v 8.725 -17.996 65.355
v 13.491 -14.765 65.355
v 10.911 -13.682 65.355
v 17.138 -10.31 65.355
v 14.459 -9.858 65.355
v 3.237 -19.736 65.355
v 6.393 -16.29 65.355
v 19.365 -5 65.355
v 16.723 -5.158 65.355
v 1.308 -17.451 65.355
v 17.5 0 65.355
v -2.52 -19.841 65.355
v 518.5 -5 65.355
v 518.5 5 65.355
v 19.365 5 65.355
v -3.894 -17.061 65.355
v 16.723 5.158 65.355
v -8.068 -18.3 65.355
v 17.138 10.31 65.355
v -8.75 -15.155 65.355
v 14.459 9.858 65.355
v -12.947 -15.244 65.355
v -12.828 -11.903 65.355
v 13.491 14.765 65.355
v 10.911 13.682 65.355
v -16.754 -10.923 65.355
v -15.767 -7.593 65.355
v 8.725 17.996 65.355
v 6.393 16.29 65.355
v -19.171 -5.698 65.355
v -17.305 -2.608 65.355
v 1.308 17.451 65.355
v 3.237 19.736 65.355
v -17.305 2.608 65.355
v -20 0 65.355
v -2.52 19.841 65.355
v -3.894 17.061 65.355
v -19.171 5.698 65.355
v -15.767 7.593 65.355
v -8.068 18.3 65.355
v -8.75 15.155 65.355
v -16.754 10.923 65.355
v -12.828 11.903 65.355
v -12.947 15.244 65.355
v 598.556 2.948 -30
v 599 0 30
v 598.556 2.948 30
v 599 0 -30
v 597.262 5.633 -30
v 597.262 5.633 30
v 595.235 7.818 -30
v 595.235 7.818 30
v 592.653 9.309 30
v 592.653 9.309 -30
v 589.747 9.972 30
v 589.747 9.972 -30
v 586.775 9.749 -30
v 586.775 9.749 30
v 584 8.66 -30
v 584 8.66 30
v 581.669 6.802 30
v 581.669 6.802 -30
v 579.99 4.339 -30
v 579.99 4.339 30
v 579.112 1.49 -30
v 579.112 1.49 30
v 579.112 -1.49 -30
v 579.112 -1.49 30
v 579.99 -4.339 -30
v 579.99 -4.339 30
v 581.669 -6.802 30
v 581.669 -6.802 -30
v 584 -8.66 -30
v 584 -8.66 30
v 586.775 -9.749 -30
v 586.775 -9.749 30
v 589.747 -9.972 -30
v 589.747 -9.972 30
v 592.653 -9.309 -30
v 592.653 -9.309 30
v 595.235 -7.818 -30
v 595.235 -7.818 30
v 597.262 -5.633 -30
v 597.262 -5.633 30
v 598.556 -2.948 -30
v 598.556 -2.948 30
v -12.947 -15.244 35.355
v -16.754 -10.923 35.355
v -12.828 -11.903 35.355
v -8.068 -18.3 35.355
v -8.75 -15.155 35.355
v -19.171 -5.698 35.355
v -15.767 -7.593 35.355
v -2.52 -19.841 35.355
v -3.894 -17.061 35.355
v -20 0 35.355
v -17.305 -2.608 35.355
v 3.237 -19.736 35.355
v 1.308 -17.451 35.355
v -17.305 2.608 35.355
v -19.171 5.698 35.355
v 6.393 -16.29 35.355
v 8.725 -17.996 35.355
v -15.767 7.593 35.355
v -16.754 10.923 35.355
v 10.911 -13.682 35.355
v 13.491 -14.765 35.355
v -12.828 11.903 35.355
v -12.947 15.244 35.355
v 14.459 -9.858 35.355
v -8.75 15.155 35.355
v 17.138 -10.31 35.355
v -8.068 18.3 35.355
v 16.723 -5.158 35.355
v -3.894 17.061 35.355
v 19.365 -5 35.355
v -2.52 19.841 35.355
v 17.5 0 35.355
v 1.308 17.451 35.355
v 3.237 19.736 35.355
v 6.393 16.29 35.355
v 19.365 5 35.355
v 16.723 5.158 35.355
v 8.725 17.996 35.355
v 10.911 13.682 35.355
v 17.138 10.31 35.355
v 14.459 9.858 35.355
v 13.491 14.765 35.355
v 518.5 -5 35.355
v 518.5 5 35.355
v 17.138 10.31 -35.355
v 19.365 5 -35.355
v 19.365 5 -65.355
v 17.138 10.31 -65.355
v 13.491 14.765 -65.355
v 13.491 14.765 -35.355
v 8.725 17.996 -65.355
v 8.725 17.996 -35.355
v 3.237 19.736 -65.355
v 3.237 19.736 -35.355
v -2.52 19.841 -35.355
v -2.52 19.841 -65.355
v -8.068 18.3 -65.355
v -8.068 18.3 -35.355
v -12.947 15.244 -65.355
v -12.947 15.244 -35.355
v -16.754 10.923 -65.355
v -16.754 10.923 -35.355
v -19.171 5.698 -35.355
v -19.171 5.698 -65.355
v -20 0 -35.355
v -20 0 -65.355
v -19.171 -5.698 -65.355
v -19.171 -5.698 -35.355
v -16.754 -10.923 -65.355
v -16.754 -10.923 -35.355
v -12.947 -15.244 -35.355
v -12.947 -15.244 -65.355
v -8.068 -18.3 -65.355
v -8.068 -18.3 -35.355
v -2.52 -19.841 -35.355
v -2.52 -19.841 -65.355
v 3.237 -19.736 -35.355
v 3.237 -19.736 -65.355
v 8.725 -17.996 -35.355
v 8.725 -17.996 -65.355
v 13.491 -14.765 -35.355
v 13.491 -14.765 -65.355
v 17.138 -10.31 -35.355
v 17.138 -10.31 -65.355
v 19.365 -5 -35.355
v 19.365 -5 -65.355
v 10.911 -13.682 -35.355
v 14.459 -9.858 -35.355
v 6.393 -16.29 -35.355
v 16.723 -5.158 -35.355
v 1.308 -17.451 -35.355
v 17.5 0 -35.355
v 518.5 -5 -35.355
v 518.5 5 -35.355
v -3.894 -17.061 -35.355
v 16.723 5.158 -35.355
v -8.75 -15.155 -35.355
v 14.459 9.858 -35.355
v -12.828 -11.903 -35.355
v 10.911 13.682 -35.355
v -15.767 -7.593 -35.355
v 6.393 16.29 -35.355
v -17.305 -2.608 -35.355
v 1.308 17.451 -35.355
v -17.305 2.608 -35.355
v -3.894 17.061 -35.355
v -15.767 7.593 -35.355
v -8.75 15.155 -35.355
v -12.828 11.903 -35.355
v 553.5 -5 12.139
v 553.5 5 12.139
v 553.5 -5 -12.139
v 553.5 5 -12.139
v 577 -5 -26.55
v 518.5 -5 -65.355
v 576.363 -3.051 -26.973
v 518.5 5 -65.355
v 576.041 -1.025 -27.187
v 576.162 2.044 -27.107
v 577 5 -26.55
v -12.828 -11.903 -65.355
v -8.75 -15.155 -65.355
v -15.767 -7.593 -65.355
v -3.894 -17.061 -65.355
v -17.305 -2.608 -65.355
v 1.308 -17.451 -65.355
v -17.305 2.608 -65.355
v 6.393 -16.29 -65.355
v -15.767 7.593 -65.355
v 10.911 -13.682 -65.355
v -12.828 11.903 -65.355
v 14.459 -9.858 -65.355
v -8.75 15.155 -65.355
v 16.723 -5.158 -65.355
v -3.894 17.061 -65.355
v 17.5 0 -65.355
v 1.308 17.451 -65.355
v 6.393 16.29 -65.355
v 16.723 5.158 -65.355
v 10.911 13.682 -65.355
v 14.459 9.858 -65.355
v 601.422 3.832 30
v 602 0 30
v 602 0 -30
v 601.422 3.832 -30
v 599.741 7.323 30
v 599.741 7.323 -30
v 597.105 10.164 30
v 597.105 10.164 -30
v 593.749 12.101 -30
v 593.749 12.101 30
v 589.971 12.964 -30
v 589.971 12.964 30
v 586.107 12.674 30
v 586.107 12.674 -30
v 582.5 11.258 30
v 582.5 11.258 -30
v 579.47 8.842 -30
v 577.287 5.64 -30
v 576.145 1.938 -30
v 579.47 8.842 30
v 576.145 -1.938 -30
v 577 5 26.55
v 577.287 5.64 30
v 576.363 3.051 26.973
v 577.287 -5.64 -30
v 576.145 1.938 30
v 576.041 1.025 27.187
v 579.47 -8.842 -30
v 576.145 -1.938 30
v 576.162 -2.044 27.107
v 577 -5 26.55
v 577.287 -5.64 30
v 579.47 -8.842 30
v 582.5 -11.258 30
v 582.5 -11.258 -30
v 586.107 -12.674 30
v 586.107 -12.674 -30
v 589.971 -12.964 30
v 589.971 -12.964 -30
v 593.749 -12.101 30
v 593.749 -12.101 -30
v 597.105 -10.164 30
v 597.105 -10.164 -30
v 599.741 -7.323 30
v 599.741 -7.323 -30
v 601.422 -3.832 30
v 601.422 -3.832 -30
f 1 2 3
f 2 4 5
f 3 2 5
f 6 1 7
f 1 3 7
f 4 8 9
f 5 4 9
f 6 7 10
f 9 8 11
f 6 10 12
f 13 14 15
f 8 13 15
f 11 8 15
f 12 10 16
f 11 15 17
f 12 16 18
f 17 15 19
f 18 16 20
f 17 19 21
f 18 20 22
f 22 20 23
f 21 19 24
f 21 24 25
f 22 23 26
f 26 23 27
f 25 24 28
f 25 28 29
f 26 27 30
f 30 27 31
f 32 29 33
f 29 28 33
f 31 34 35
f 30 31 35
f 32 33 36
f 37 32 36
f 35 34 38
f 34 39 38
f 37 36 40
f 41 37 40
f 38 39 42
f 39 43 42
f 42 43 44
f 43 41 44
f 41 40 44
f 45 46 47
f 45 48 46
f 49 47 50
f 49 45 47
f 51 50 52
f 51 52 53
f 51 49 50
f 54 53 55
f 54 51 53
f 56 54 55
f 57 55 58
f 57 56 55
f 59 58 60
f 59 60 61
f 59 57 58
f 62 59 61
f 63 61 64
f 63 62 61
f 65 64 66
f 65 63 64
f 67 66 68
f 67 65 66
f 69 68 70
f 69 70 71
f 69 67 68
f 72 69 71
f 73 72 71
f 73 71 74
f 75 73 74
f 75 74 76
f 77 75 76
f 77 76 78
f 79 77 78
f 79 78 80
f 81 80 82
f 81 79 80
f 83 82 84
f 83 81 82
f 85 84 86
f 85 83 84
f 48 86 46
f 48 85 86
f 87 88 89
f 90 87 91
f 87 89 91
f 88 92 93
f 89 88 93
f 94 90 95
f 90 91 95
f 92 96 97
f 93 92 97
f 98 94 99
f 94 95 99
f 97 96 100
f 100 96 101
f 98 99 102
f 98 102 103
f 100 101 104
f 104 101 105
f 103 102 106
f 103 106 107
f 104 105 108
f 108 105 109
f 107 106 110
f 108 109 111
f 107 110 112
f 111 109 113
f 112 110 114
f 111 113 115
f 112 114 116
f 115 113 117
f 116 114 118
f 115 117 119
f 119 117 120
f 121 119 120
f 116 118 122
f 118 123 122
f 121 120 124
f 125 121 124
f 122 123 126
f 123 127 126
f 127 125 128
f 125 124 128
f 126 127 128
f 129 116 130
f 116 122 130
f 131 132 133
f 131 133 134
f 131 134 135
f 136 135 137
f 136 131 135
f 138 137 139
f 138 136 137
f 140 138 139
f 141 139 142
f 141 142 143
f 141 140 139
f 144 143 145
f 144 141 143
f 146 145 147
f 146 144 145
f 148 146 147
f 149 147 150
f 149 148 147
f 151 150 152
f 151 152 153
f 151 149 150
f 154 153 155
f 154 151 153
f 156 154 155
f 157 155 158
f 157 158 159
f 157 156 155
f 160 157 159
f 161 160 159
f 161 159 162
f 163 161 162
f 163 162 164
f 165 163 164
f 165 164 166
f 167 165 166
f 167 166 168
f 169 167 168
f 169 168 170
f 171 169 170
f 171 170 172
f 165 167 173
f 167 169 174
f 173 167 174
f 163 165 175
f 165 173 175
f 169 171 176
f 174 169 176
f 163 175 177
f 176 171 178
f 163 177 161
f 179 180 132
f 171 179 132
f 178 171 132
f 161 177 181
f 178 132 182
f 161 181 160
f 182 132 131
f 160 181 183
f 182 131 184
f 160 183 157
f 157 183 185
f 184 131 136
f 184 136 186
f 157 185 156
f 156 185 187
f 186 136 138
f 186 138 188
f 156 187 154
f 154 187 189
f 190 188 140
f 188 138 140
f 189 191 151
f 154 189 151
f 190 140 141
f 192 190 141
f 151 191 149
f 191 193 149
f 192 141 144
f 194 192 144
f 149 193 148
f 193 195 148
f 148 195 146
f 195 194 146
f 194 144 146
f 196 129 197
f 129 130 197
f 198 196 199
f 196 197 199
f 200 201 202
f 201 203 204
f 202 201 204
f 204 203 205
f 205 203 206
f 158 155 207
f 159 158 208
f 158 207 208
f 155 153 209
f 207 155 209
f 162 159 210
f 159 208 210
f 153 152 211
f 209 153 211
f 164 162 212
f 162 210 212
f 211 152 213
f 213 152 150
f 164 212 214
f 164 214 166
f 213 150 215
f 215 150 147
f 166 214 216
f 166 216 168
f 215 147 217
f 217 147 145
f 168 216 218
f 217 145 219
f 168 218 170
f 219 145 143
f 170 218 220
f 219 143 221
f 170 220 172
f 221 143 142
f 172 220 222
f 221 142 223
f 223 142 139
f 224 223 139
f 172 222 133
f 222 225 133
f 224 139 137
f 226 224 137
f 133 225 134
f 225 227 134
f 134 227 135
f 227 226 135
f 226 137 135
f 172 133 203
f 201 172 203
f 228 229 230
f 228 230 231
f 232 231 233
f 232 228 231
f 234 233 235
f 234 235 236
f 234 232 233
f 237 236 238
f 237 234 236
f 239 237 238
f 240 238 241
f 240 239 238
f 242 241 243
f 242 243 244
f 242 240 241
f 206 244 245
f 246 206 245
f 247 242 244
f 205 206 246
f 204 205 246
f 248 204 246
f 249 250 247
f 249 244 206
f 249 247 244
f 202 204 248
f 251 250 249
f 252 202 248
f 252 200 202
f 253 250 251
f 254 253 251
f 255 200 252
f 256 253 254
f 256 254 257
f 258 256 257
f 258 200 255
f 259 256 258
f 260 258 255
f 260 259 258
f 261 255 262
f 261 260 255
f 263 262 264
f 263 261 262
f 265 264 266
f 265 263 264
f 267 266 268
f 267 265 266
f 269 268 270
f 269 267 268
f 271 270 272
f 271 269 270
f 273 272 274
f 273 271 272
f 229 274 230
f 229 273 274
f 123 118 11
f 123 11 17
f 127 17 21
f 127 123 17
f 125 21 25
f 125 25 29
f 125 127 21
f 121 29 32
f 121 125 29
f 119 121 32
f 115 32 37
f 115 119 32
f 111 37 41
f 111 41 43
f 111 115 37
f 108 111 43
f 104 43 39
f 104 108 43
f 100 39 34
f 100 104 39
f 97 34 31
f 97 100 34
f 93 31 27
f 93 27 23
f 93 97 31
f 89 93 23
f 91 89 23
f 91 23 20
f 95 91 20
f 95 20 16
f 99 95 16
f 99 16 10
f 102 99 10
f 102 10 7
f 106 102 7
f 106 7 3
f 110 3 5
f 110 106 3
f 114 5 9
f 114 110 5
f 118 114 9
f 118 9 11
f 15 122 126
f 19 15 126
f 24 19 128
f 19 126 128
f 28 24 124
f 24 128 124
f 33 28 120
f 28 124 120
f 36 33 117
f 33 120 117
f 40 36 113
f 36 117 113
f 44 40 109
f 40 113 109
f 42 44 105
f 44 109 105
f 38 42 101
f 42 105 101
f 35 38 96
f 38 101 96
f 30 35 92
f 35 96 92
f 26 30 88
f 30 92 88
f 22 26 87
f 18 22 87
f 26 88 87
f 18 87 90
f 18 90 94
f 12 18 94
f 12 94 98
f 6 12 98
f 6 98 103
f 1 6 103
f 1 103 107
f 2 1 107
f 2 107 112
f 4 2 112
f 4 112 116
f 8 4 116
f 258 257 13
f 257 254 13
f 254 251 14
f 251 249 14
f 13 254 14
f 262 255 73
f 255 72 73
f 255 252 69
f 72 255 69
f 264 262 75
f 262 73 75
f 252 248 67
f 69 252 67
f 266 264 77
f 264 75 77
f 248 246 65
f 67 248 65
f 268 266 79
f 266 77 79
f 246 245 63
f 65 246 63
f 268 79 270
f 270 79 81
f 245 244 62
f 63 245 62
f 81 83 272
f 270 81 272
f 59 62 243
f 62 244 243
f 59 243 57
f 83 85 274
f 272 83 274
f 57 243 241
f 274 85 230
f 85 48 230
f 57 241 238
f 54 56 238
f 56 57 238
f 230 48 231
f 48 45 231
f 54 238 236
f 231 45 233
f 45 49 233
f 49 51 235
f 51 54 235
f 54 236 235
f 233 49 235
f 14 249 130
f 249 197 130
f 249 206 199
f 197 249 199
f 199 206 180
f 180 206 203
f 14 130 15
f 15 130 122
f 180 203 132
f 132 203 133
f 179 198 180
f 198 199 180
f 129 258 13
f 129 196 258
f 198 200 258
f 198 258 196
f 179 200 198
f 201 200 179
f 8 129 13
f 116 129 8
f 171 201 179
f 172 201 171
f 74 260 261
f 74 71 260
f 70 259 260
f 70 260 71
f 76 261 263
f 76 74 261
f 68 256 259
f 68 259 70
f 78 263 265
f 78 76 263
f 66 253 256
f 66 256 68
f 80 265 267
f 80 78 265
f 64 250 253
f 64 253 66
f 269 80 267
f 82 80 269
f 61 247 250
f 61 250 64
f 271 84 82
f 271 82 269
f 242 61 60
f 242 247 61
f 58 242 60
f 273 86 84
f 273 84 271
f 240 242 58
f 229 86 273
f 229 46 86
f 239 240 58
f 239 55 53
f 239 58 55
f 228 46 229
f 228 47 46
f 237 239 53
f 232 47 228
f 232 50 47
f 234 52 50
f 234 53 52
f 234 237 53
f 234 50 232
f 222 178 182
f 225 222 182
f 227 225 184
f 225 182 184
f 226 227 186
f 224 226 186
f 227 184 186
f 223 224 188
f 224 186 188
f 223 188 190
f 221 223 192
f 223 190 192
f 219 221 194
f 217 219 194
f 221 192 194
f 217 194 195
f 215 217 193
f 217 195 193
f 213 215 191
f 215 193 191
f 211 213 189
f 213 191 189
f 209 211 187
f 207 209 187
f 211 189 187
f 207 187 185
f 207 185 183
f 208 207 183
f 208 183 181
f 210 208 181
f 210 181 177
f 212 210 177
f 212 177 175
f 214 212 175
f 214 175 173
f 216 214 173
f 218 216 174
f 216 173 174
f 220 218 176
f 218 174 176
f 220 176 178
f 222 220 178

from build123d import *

# Parameters (mm, degrees)
SKETCH2_R           = 20
SKETCH2_R_2         = 17.5
BOSS_EXTRUDE1_DEPTH = 30
SKETCH3_R           = 20
SKETCH3_R_2         = 17.5
BOSS_EXTRUDE2_DEPTH = 30
BOSS_EXTRUDE3_DEPTH = 5
SKETCH5_R           = 13
SKETCH5_R_2         = 10
BOSS_EXTRUDE4_DEPTH = 30


with BuildPart() as part:
    # Sketch2 → Boss-Extrude1 (new body)
    with BuildSketch(Plane.XY.offset(-35.355)):
        Circle(SKETCH2_R)
        Circle(SKETCH2_R_2, mode=Mode.SUBTRACT)
    extrude(amount=-BOSS_EXTRUDE1_DEPTH)



with BuildPart() as body_2:
    # Sketch3 → Boss-Extrude2 (new body)
    with BuildSketch(Plane.XY.offset(35.355)):
        Circle(SKETCH3_R)
        Circle(SKETCH3_R_2, mode=Mode.SUBTRACT)
    extrude(amount=BOSS_EXTRUDE2_DEPTH)


with BuildPart() as part_1:
    add(part.part)

    add(body_2.part)  # Boss-Extrude3 merges body 2
    # Sketch4 → Boss-Extrude3 (add, symmetric)
    with BuildSketch(Plane(origin=(0, 0, 0), x_dir=(1, 0, 0), z_dir=(0, 1, 0))):
        Polygon((18.5, -65.355), (18.5, -35.355), (518.5, -35.355), (553.5, -12.138626468), (553.5, 12.138626468), (518.5, 35.355), (18.5, 35.355), (18.5, 65.355), (518.5, 65.355), (578.5, 25.555502516), (578.5, -25.555502516), (518.5, -65.355), align=None)
    extrude(amount=BOSS_EXTRUDE3_DEPTH, both=True)

    # Sketch5 → Boss-Extrude4 (add, symmetric)
    with BuildSketch(Plane.XY):
        with Locations((589, 0)):
            Circle(SKETCH5_R)
        with Locations((589, 0)):
            Circle(SKETCH5_R_2, mode=Mode.SUBTRACT)
    extrude(amount=BOSS_EXTRUDE4_DEPTH, both=True)


solid = part_1.part
